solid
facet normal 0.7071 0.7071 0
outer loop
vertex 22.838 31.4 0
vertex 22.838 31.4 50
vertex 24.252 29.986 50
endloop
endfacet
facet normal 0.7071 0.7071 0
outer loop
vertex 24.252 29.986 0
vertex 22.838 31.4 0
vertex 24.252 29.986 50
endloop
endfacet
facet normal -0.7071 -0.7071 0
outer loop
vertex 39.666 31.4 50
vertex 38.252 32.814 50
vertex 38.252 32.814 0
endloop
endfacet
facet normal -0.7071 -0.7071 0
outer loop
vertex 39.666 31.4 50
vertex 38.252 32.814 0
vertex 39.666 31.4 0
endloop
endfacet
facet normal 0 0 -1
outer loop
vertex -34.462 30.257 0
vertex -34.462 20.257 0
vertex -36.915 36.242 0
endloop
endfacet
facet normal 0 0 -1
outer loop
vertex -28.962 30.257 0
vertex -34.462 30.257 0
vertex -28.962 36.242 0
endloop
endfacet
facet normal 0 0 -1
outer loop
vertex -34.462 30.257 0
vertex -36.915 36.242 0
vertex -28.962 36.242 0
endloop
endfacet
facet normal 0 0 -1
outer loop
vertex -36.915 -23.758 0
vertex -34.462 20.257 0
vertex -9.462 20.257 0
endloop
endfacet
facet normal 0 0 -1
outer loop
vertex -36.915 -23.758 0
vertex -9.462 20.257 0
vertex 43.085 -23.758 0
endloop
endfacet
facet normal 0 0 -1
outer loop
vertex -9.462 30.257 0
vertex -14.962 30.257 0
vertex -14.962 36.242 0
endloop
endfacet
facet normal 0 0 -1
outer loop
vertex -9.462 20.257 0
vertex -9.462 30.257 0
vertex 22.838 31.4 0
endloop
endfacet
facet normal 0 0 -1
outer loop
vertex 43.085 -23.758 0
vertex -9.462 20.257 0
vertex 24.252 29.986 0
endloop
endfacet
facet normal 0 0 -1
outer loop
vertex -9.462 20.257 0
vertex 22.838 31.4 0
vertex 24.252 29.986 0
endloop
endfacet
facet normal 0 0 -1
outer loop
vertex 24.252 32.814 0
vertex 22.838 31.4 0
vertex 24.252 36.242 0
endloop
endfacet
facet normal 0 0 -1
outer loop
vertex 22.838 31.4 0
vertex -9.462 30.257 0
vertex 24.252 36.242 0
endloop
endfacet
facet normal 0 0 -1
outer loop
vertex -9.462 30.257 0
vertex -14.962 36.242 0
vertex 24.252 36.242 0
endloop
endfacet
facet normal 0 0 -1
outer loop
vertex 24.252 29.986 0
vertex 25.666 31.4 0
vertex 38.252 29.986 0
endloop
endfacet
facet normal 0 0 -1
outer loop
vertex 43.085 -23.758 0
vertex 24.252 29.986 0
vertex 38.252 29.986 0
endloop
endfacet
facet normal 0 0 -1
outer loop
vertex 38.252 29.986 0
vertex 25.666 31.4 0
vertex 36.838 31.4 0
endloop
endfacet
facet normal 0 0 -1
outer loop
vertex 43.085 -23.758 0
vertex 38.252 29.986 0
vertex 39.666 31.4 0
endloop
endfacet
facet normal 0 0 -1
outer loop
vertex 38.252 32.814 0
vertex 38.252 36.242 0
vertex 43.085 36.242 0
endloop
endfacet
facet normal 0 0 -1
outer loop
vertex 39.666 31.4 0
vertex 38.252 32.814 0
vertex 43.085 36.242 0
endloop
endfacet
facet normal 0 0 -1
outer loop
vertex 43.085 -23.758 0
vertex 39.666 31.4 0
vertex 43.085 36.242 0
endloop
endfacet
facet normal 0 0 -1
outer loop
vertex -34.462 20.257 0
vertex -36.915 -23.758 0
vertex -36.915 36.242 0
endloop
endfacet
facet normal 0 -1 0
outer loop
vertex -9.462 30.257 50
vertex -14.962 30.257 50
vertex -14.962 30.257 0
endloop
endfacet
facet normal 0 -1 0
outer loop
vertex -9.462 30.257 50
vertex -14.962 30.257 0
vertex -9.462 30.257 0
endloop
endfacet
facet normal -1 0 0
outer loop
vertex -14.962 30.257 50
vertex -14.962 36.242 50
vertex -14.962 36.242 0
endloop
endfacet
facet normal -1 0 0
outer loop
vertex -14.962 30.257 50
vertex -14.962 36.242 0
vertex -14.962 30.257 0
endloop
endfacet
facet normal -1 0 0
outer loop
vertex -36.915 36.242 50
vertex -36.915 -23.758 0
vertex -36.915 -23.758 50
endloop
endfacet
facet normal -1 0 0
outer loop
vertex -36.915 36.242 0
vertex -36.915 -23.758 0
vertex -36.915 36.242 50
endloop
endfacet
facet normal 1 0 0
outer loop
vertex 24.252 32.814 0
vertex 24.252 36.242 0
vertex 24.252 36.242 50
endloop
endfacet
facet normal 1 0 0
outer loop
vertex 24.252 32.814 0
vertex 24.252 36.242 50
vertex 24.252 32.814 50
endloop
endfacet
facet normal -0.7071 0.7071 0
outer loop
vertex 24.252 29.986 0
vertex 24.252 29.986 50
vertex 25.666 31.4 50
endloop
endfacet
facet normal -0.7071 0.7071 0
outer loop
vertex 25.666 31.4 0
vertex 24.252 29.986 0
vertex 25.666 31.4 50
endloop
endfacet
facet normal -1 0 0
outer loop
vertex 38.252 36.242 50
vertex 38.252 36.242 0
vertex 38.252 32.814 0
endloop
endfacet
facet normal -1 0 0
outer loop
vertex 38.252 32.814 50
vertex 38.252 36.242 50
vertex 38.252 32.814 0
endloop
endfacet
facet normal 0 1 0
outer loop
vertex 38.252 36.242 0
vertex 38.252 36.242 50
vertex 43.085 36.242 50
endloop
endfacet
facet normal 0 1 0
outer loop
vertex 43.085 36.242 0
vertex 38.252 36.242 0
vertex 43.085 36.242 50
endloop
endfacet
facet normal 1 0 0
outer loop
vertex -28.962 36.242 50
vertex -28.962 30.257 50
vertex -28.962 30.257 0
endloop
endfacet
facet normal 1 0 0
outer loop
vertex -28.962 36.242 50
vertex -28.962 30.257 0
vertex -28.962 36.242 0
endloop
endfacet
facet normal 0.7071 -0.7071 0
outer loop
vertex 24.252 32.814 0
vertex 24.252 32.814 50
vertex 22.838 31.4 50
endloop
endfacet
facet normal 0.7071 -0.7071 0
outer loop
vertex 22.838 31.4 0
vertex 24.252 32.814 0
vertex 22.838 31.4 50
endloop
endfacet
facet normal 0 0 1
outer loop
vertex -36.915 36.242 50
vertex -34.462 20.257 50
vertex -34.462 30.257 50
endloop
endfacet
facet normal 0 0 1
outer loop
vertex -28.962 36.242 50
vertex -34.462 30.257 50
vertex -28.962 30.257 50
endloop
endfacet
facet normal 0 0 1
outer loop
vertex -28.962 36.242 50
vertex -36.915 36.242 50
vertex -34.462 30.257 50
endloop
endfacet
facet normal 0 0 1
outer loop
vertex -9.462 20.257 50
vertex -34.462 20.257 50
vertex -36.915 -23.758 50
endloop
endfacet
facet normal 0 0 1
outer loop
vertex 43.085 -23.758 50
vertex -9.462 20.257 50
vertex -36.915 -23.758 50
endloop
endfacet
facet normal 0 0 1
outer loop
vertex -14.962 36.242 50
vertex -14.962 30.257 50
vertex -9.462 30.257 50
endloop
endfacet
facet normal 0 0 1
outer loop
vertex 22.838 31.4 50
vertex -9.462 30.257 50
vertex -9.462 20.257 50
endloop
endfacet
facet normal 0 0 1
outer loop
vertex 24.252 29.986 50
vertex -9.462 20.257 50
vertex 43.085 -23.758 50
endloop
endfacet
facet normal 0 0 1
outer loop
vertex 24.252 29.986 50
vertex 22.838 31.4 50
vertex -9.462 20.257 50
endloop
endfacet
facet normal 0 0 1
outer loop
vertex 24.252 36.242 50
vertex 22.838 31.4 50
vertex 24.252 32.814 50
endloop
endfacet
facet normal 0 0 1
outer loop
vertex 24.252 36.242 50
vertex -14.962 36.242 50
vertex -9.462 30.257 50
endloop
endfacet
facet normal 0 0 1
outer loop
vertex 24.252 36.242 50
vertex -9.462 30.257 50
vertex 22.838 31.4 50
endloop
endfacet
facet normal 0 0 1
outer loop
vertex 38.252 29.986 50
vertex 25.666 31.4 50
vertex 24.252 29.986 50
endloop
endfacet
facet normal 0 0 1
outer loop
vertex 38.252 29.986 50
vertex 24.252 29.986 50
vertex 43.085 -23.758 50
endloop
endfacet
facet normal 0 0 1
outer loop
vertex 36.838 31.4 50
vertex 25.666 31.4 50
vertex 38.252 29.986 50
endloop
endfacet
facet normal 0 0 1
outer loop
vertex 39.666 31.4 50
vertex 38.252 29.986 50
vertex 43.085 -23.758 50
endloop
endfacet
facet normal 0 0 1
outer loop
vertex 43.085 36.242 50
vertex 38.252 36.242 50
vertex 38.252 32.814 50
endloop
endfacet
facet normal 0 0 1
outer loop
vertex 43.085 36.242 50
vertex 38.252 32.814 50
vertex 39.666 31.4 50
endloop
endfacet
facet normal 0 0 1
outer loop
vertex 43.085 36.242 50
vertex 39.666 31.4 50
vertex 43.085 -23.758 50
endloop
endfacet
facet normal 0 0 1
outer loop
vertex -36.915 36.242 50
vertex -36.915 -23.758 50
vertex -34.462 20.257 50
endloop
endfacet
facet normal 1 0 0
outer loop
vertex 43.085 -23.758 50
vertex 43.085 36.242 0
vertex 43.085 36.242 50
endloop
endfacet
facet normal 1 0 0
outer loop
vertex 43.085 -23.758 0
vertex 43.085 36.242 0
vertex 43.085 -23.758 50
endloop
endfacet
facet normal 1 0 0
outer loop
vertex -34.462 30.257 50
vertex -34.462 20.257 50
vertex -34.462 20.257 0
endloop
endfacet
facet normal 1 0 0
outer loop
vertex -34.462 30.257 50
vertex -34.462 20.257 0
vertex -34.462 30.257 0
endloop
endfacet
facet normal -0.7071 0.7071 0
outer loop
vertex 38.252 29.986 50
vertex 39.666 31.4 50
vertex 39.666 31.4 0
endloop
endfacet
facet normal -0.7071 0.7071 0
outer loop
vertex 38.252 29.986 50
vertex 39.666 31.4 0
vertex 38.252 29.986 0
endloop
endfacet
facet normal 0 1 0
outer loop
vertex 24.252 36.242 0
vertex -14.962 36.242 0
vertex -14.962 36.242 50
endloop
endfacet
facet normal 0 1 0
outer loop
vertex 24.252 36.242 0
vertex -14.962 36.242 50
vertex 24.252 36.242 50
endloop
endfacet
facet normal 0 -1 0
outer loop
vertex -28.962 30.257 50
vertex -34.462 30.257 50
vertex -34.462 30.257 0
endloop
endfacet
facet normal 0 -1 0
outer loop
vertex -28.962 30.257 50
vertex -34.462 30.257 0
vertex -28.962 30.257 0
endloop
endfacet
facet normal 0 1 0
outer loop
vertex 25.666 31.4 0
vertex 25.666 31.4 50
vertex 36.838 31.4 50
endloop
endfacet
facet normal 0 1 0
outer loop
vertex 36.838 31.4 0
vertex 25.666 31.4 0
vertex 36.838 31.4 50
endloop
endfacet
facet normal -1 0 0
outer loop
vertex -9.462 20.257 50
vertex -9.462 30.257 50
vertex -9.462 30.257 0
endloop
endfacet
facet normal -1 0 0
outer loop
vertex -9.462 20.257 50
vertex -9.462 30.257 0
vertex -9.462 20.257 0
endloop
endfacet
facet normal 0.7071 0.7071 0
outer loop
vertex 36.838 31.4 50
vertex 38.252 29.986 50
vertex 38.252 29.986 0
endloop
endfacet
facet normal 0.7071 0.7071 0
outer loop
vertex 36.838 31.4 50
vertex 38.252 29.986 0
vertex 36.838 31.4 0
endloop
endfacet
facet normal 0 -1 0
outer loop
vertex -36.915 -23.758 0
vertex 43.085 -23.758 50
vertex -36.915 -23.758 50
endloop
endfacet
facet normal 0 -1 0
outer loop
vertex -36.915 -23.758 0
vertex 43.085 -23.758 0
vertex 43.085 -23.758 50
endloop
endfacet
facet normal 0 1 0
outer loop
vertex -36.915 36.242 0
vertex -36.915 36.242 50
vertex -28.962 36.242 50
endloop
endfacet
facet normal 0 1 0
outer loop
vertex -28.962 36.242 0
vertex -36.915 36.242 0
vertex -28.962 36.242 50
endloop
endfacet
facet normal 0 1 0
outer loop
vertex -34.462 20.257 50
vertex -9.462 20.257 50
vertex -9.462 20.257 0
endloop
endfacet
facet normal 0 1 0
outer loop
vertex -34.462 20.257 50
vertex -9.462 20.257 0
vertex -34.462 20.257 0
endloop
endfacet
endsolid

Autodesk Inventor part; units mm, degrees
ref_plane "YZ Plane" through (0, 0, 0) normal (1, 0, 0) x (0, 1, 0)
ref_plane "XZ Plane" through (0, 0, 0) normal (0, 1, 0) x (-1, 0, 0)
ref_plane "XY Plane" through (0, 0, 0) normal (0, 0, 1) x (1, 0, 0)
sketch "Sketch1" plane through (0, 0, 0) normal (0, 0, 1) x (1, 0, 0)
  line L0 (-36.9152, 36.2425) -> (43.0848, 36.2425)
  line L1 (43.0848, 36.2425) -> (43.0848, -23.7575)
  line L2 (43.0848, -23.7575) -> (-36.9152, -23.7575)
  line L3 (-36.9152, -23.7575) -> (-36.9152, 36.2425)
  point P0 (0, 0)
  dimension "d0" = 80
  dimension "d1" = 60
extrude "Extrusion1" add sketch "Sketch1" along normal blind 50
sketch "Sketch2" plane through (0, 0, 50) normal (0, 0, 1) x (1, 0, 0)
  line L0 (-34.4619, 20.2567) -> (-34.4619, 30.2567)
  line L1 (-34.4619, 30.2567) -> (-28.9619, 30.2567)
  line L2 (-28.9619, 30.2567) -> (-28.9619, 39.2567)
  line L3 (-28.9619, 39.2567) -> (-14.9619, 39.2567)
  line L4 (-14.9619, 39.2567) -> (-14.9619, 30.2567)
  line L5 (-14.9619, 30.2567) -> (-9.4619, 30.2567)
  line L6 (-9.4619, 30.2567) -> (-9.4619, 20.2567)
  line L7 (-9.4619, 20.2567) -> (-34.4619, 20.2567)
  point P0 (0, 0)
  point P1 (-21.9619, 39.2567)
  dimension "d4" = 14
  dimension "d5" = 9
  dimension "d6" = 10
  dimension "d7" = 12.5
  dimension "d8" = 25
  dimension "d9" = 7
extrude "Extrusion2" cut sketch "Sketch2" against normal blind 50
sketch "Sketch5" plane through (0, 0, 50) normal (0, 0, 1) x (1, 0, 0)
  line L0 (31.2523, 36.3999) -> (38.2523, 36.3999)
  line L1 (38.2523, 36.3999) -> (38.2523, 32.8141)
  line L2 (38.2523, 32.8141) -> (39.6665, 31.3999)
  line L3 (39.6665, 31.3999) -> (38.2523, 29.9857)
  line L4 (38.2523, 29.9857) -> (36.8381, 31.3999)
  line L5 (36.8381, 31.3999) -> (31.2523, 31.3999)
  line L6 (31.2523, 36.3999) -> (31.2523, 31.3999) construction
  line L7 (31.2523, 36.3999) -> (24.2523, 36.3999)
  line L8 (24.2523, 36.3999) -> (24.2523, 32.8141)
  line L9 (24.2523, 32.8141) -> (22.8381, 31.3999)
  line L10 (22.8381, 31.3999) -> (24.2523, 29.9857)
  line L11 (24.2523, 29.9857) -> (25.6665, 31.3999)
  line L12 (25.6665, 31.3999) -> (31.2523, 31.3999)
  point P0 (0, 0)
  dimension "d27" = 7
  dimension "d28" = 2
  dimension "d29" = 2
  dimension "d30" = 135
  dimension "d31" = 90
  dimension "d32" = 5
  dimension "d33" = 2
extrude "Extrusion3" cut sketch "Sketch5" against normal blind 50
properties part number "PiesaSuportCanale"
